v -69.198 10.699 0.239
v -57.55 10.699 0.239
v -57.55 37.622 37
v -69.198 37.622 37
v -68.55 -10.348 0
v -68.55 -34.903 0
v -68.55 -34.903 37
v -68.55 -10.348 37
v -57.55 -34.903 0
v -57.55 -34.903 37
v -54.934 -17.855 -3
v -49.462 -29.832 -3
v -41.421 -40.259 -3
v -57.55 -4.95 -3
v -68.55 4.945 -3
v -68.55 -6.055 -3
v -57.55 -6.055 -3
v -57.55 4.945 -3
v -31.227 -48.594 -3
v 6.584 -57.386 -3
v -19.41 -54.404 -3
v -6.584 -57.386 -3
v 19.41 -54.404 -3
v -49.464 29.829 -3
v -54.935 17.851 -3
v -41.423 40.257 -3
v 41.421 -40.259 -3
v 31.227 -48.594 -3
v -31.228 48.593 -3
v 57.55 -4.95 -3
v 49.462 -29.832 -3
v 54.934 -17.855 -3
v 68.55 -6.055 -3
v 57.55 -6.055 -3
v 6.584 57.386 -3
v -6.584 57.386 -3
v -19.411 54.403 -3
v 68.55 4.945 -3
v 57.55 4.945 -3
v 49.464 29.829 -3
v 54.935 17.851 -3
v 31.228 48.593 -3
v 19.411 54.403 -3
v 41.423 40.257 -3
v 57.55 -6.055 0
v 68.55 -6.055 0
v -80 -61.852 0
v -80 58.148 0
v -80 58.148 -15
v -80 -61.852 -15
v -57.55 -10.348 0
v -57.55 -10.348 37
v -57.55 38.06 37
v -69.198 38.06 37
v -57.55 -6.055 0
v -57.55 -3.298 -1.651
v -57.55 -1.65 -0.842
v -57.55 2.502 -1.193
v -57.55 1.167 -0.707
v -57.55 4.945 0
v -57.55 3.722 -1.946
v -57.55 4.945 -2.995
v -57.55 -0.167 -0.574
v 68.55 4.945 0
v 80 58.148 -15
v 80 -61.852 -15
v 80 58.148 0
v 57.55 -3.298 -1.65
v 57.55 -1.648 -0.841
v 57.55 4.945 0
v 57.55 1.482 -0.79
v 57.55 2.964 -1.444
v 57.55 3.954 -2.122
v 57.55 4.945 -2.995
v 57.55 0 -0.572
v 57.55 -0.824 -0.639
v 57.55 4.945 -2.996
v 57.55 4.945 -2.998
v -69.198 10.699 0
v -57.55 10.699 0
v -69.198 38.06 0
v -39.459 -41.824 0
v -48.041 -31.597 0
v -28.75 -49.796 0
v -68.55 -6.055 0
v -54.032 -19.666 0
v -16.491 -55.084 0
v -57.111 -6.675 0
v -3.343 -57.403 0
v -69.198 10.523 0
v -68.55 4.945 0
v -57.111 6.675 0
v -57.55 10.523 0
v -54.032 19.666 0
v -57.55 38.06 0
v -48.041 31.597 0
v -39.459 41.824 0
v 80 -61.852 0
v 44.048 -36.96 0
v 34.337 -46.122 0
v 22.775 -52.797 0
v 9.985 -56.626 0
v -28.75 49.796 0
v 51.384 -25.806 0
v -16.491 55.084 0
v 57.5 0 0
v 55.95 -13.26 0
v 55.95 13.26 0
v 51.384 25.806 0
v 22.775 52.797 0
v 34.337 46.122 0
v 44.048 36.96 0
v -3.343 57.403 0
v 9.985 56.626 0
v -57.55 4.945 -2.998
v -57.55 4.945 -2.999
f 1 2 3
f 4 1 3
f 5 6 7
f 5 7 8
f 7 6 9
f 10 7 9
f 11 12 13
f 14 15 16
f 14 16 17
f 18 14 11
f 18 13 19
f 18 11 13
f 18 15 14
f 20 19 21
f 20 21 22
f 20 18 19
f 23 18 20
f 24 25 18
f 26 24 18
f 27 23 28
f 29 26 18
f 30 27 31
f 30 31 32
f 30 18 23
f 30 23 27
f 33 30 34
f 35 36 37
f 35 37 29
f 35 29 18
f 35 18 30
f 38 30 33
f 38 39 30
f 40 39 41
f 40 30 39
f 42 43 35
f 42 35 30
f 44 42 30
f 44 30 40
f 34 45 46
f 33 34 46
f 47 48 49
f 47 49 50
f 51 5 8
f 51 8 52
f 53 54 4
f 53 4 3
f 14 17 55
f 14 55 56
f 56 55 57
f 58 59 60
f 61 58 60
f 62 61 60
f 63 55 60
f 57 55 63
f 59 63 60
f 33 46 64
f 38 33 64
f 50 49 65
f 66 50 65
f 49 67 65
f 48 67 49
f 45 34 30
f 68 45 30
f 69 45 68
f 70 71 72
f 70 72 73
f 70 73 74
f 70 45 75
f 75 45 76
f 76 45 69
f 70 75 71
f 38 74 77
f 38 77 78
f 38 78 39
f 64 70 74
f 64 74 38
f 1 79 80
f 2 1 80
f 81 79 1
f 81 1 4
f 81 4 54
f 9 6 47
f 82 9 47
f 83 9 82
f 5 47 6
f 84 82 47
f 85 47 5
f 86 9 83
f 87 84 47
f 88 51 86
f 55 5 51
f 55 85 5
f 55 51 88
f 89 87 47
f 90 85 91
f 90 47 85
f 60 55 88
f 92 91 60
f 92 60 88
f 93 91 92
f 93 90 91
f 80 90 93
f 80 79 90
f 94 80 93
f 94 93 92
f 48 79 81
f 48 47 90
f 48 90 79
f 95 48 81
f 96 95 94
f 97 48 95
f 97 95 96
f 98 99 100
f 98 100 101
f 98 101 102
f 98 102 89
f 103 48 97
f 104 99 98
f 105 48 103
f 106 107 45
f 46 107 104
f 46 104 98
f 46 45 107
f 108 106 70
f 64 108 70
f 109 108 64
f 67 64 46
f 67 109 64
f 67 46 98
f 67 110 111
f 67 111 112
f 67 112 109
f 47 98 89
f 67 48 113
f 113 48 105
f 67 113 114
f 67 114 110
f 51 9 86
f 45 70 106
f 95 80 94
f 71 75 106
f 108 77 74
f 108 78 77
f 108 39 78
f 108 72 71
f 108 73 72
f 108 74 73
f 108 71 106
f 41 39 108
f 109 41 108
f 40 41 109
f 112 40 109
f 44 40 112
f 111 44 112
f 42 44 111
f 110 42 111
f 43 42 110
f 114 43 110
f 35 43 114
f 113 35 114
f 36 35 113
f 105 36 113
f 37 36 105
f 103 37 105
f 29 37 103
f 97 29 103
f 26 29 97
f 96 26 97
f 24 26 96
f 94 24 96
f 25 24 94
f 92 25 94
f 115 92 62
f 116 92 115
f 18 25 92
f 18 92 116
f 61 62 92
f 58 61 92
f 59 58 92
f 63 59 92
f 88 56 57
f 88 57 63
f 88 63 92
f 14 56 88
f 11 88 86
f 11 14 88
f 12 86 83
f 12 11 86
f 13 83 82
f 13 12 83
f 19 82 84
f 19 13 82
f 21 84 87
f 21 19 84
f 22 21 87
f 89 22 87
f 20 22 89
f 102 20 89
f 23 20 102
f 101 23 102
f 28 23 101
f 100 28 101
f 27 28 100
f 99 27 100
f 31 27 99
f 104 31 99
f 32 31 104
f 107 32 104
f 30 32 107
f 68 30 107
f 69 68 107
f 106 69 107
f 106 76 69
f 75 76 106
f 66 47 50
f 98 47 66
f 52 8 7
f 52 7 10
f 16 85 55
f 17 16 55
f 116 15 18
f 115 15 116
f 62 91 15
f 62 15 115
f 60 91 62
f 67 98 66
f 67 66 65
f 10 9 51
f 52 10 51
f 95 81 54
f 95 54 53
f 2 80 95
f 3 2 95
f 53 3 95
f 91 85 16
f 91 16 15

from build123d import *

# Parameters (mm, degrees)
F0_W     = 79.9999842666
F0_H     = 60
F0_W_2   = 80.0000157334
F1_DEPTH = 15
F2_R     = 57.5
F3_DEPTH = 3
F3_TAPER = -5
F4_W     = 11.6479038
F4_H     = 27.360801585
F4_W_2   = 11
F4_H_2   = 11
F4_H_3   = 24.5545655489
F5_DEPTH = 3
F6_DEPTH = 40
F9_DEPTH = 11.6479038


with BuildPart() as f1:
    # F0 (on Top) → F1 (new body)
    with BuildSketch(Plane.XY):
        with Locations((-39.9999921333, 28.1481473105)):
            Rectangle(F0_W, F0_H)
        with Locations((40.0000078667, 28.1481473105)):
            Rectangle(F0_W_2, F0_H)
        with Locations((40.0000078667, -31.8518526895)):
            Rectangle(F0_W_2, F0_H)
        with Locations((-39.9999921333, -31.8518526895)):
            Rectangle(F0_W, F0_H)
    extrude(amount=-F1_DEPTH)

    # F2 (on Top) → F3 (cut)
    with BuildSketch(Plane.XY):
        Circle(F2_R)
    extrude(amount=-F3_DEPTH, taper=F3_TAPER, mode=Mode.SUBTRACT)

    # F4 (on Top) → F5 (cut)
    with BuildSketch(Plane.XY):
        with Locations((-63.3739519, 24.3791765533)):
            Rectangle(F4_W, F4_H)
        with Locations((-63.05, -0.5552865867)):
            Rectangle(F4_W_2, F4_H_2)
        with Locations((-63.05, -22.6252786815)):
            Rectangle(F4_W_2, F4_H_3)
        with Locations((63.05, -0.5552865867)):
            Rectangle(F4_W_2, F4_H_2)
    extrude(amount=-F5_DEPTH, mode=Mode.SUBTRACT)

    # F6 (add): faces of the model
    f6_faces = [f1.faces().sort_by_distance(p)[0] for p in [
        (-63.3739519, 24.3791765533, -3),
        (-63.05, -22.6252786815, -3),
    ]]
    extrude(f6_faces, amount=F6_DEPTH)

    # F8 (on offset) → F9 (cut, through all)
    with BuildSketch(Plane.YZ.offset(-57.55)):
        Polygon((37.8841944039, 37.358019501), (10.5233872309, 37.358019501), (10.5233872309, 0), align=None)
    extrude(amount=-F9_DEPTH, mode=Mode.SUBTRACT)


solid = f1.part
